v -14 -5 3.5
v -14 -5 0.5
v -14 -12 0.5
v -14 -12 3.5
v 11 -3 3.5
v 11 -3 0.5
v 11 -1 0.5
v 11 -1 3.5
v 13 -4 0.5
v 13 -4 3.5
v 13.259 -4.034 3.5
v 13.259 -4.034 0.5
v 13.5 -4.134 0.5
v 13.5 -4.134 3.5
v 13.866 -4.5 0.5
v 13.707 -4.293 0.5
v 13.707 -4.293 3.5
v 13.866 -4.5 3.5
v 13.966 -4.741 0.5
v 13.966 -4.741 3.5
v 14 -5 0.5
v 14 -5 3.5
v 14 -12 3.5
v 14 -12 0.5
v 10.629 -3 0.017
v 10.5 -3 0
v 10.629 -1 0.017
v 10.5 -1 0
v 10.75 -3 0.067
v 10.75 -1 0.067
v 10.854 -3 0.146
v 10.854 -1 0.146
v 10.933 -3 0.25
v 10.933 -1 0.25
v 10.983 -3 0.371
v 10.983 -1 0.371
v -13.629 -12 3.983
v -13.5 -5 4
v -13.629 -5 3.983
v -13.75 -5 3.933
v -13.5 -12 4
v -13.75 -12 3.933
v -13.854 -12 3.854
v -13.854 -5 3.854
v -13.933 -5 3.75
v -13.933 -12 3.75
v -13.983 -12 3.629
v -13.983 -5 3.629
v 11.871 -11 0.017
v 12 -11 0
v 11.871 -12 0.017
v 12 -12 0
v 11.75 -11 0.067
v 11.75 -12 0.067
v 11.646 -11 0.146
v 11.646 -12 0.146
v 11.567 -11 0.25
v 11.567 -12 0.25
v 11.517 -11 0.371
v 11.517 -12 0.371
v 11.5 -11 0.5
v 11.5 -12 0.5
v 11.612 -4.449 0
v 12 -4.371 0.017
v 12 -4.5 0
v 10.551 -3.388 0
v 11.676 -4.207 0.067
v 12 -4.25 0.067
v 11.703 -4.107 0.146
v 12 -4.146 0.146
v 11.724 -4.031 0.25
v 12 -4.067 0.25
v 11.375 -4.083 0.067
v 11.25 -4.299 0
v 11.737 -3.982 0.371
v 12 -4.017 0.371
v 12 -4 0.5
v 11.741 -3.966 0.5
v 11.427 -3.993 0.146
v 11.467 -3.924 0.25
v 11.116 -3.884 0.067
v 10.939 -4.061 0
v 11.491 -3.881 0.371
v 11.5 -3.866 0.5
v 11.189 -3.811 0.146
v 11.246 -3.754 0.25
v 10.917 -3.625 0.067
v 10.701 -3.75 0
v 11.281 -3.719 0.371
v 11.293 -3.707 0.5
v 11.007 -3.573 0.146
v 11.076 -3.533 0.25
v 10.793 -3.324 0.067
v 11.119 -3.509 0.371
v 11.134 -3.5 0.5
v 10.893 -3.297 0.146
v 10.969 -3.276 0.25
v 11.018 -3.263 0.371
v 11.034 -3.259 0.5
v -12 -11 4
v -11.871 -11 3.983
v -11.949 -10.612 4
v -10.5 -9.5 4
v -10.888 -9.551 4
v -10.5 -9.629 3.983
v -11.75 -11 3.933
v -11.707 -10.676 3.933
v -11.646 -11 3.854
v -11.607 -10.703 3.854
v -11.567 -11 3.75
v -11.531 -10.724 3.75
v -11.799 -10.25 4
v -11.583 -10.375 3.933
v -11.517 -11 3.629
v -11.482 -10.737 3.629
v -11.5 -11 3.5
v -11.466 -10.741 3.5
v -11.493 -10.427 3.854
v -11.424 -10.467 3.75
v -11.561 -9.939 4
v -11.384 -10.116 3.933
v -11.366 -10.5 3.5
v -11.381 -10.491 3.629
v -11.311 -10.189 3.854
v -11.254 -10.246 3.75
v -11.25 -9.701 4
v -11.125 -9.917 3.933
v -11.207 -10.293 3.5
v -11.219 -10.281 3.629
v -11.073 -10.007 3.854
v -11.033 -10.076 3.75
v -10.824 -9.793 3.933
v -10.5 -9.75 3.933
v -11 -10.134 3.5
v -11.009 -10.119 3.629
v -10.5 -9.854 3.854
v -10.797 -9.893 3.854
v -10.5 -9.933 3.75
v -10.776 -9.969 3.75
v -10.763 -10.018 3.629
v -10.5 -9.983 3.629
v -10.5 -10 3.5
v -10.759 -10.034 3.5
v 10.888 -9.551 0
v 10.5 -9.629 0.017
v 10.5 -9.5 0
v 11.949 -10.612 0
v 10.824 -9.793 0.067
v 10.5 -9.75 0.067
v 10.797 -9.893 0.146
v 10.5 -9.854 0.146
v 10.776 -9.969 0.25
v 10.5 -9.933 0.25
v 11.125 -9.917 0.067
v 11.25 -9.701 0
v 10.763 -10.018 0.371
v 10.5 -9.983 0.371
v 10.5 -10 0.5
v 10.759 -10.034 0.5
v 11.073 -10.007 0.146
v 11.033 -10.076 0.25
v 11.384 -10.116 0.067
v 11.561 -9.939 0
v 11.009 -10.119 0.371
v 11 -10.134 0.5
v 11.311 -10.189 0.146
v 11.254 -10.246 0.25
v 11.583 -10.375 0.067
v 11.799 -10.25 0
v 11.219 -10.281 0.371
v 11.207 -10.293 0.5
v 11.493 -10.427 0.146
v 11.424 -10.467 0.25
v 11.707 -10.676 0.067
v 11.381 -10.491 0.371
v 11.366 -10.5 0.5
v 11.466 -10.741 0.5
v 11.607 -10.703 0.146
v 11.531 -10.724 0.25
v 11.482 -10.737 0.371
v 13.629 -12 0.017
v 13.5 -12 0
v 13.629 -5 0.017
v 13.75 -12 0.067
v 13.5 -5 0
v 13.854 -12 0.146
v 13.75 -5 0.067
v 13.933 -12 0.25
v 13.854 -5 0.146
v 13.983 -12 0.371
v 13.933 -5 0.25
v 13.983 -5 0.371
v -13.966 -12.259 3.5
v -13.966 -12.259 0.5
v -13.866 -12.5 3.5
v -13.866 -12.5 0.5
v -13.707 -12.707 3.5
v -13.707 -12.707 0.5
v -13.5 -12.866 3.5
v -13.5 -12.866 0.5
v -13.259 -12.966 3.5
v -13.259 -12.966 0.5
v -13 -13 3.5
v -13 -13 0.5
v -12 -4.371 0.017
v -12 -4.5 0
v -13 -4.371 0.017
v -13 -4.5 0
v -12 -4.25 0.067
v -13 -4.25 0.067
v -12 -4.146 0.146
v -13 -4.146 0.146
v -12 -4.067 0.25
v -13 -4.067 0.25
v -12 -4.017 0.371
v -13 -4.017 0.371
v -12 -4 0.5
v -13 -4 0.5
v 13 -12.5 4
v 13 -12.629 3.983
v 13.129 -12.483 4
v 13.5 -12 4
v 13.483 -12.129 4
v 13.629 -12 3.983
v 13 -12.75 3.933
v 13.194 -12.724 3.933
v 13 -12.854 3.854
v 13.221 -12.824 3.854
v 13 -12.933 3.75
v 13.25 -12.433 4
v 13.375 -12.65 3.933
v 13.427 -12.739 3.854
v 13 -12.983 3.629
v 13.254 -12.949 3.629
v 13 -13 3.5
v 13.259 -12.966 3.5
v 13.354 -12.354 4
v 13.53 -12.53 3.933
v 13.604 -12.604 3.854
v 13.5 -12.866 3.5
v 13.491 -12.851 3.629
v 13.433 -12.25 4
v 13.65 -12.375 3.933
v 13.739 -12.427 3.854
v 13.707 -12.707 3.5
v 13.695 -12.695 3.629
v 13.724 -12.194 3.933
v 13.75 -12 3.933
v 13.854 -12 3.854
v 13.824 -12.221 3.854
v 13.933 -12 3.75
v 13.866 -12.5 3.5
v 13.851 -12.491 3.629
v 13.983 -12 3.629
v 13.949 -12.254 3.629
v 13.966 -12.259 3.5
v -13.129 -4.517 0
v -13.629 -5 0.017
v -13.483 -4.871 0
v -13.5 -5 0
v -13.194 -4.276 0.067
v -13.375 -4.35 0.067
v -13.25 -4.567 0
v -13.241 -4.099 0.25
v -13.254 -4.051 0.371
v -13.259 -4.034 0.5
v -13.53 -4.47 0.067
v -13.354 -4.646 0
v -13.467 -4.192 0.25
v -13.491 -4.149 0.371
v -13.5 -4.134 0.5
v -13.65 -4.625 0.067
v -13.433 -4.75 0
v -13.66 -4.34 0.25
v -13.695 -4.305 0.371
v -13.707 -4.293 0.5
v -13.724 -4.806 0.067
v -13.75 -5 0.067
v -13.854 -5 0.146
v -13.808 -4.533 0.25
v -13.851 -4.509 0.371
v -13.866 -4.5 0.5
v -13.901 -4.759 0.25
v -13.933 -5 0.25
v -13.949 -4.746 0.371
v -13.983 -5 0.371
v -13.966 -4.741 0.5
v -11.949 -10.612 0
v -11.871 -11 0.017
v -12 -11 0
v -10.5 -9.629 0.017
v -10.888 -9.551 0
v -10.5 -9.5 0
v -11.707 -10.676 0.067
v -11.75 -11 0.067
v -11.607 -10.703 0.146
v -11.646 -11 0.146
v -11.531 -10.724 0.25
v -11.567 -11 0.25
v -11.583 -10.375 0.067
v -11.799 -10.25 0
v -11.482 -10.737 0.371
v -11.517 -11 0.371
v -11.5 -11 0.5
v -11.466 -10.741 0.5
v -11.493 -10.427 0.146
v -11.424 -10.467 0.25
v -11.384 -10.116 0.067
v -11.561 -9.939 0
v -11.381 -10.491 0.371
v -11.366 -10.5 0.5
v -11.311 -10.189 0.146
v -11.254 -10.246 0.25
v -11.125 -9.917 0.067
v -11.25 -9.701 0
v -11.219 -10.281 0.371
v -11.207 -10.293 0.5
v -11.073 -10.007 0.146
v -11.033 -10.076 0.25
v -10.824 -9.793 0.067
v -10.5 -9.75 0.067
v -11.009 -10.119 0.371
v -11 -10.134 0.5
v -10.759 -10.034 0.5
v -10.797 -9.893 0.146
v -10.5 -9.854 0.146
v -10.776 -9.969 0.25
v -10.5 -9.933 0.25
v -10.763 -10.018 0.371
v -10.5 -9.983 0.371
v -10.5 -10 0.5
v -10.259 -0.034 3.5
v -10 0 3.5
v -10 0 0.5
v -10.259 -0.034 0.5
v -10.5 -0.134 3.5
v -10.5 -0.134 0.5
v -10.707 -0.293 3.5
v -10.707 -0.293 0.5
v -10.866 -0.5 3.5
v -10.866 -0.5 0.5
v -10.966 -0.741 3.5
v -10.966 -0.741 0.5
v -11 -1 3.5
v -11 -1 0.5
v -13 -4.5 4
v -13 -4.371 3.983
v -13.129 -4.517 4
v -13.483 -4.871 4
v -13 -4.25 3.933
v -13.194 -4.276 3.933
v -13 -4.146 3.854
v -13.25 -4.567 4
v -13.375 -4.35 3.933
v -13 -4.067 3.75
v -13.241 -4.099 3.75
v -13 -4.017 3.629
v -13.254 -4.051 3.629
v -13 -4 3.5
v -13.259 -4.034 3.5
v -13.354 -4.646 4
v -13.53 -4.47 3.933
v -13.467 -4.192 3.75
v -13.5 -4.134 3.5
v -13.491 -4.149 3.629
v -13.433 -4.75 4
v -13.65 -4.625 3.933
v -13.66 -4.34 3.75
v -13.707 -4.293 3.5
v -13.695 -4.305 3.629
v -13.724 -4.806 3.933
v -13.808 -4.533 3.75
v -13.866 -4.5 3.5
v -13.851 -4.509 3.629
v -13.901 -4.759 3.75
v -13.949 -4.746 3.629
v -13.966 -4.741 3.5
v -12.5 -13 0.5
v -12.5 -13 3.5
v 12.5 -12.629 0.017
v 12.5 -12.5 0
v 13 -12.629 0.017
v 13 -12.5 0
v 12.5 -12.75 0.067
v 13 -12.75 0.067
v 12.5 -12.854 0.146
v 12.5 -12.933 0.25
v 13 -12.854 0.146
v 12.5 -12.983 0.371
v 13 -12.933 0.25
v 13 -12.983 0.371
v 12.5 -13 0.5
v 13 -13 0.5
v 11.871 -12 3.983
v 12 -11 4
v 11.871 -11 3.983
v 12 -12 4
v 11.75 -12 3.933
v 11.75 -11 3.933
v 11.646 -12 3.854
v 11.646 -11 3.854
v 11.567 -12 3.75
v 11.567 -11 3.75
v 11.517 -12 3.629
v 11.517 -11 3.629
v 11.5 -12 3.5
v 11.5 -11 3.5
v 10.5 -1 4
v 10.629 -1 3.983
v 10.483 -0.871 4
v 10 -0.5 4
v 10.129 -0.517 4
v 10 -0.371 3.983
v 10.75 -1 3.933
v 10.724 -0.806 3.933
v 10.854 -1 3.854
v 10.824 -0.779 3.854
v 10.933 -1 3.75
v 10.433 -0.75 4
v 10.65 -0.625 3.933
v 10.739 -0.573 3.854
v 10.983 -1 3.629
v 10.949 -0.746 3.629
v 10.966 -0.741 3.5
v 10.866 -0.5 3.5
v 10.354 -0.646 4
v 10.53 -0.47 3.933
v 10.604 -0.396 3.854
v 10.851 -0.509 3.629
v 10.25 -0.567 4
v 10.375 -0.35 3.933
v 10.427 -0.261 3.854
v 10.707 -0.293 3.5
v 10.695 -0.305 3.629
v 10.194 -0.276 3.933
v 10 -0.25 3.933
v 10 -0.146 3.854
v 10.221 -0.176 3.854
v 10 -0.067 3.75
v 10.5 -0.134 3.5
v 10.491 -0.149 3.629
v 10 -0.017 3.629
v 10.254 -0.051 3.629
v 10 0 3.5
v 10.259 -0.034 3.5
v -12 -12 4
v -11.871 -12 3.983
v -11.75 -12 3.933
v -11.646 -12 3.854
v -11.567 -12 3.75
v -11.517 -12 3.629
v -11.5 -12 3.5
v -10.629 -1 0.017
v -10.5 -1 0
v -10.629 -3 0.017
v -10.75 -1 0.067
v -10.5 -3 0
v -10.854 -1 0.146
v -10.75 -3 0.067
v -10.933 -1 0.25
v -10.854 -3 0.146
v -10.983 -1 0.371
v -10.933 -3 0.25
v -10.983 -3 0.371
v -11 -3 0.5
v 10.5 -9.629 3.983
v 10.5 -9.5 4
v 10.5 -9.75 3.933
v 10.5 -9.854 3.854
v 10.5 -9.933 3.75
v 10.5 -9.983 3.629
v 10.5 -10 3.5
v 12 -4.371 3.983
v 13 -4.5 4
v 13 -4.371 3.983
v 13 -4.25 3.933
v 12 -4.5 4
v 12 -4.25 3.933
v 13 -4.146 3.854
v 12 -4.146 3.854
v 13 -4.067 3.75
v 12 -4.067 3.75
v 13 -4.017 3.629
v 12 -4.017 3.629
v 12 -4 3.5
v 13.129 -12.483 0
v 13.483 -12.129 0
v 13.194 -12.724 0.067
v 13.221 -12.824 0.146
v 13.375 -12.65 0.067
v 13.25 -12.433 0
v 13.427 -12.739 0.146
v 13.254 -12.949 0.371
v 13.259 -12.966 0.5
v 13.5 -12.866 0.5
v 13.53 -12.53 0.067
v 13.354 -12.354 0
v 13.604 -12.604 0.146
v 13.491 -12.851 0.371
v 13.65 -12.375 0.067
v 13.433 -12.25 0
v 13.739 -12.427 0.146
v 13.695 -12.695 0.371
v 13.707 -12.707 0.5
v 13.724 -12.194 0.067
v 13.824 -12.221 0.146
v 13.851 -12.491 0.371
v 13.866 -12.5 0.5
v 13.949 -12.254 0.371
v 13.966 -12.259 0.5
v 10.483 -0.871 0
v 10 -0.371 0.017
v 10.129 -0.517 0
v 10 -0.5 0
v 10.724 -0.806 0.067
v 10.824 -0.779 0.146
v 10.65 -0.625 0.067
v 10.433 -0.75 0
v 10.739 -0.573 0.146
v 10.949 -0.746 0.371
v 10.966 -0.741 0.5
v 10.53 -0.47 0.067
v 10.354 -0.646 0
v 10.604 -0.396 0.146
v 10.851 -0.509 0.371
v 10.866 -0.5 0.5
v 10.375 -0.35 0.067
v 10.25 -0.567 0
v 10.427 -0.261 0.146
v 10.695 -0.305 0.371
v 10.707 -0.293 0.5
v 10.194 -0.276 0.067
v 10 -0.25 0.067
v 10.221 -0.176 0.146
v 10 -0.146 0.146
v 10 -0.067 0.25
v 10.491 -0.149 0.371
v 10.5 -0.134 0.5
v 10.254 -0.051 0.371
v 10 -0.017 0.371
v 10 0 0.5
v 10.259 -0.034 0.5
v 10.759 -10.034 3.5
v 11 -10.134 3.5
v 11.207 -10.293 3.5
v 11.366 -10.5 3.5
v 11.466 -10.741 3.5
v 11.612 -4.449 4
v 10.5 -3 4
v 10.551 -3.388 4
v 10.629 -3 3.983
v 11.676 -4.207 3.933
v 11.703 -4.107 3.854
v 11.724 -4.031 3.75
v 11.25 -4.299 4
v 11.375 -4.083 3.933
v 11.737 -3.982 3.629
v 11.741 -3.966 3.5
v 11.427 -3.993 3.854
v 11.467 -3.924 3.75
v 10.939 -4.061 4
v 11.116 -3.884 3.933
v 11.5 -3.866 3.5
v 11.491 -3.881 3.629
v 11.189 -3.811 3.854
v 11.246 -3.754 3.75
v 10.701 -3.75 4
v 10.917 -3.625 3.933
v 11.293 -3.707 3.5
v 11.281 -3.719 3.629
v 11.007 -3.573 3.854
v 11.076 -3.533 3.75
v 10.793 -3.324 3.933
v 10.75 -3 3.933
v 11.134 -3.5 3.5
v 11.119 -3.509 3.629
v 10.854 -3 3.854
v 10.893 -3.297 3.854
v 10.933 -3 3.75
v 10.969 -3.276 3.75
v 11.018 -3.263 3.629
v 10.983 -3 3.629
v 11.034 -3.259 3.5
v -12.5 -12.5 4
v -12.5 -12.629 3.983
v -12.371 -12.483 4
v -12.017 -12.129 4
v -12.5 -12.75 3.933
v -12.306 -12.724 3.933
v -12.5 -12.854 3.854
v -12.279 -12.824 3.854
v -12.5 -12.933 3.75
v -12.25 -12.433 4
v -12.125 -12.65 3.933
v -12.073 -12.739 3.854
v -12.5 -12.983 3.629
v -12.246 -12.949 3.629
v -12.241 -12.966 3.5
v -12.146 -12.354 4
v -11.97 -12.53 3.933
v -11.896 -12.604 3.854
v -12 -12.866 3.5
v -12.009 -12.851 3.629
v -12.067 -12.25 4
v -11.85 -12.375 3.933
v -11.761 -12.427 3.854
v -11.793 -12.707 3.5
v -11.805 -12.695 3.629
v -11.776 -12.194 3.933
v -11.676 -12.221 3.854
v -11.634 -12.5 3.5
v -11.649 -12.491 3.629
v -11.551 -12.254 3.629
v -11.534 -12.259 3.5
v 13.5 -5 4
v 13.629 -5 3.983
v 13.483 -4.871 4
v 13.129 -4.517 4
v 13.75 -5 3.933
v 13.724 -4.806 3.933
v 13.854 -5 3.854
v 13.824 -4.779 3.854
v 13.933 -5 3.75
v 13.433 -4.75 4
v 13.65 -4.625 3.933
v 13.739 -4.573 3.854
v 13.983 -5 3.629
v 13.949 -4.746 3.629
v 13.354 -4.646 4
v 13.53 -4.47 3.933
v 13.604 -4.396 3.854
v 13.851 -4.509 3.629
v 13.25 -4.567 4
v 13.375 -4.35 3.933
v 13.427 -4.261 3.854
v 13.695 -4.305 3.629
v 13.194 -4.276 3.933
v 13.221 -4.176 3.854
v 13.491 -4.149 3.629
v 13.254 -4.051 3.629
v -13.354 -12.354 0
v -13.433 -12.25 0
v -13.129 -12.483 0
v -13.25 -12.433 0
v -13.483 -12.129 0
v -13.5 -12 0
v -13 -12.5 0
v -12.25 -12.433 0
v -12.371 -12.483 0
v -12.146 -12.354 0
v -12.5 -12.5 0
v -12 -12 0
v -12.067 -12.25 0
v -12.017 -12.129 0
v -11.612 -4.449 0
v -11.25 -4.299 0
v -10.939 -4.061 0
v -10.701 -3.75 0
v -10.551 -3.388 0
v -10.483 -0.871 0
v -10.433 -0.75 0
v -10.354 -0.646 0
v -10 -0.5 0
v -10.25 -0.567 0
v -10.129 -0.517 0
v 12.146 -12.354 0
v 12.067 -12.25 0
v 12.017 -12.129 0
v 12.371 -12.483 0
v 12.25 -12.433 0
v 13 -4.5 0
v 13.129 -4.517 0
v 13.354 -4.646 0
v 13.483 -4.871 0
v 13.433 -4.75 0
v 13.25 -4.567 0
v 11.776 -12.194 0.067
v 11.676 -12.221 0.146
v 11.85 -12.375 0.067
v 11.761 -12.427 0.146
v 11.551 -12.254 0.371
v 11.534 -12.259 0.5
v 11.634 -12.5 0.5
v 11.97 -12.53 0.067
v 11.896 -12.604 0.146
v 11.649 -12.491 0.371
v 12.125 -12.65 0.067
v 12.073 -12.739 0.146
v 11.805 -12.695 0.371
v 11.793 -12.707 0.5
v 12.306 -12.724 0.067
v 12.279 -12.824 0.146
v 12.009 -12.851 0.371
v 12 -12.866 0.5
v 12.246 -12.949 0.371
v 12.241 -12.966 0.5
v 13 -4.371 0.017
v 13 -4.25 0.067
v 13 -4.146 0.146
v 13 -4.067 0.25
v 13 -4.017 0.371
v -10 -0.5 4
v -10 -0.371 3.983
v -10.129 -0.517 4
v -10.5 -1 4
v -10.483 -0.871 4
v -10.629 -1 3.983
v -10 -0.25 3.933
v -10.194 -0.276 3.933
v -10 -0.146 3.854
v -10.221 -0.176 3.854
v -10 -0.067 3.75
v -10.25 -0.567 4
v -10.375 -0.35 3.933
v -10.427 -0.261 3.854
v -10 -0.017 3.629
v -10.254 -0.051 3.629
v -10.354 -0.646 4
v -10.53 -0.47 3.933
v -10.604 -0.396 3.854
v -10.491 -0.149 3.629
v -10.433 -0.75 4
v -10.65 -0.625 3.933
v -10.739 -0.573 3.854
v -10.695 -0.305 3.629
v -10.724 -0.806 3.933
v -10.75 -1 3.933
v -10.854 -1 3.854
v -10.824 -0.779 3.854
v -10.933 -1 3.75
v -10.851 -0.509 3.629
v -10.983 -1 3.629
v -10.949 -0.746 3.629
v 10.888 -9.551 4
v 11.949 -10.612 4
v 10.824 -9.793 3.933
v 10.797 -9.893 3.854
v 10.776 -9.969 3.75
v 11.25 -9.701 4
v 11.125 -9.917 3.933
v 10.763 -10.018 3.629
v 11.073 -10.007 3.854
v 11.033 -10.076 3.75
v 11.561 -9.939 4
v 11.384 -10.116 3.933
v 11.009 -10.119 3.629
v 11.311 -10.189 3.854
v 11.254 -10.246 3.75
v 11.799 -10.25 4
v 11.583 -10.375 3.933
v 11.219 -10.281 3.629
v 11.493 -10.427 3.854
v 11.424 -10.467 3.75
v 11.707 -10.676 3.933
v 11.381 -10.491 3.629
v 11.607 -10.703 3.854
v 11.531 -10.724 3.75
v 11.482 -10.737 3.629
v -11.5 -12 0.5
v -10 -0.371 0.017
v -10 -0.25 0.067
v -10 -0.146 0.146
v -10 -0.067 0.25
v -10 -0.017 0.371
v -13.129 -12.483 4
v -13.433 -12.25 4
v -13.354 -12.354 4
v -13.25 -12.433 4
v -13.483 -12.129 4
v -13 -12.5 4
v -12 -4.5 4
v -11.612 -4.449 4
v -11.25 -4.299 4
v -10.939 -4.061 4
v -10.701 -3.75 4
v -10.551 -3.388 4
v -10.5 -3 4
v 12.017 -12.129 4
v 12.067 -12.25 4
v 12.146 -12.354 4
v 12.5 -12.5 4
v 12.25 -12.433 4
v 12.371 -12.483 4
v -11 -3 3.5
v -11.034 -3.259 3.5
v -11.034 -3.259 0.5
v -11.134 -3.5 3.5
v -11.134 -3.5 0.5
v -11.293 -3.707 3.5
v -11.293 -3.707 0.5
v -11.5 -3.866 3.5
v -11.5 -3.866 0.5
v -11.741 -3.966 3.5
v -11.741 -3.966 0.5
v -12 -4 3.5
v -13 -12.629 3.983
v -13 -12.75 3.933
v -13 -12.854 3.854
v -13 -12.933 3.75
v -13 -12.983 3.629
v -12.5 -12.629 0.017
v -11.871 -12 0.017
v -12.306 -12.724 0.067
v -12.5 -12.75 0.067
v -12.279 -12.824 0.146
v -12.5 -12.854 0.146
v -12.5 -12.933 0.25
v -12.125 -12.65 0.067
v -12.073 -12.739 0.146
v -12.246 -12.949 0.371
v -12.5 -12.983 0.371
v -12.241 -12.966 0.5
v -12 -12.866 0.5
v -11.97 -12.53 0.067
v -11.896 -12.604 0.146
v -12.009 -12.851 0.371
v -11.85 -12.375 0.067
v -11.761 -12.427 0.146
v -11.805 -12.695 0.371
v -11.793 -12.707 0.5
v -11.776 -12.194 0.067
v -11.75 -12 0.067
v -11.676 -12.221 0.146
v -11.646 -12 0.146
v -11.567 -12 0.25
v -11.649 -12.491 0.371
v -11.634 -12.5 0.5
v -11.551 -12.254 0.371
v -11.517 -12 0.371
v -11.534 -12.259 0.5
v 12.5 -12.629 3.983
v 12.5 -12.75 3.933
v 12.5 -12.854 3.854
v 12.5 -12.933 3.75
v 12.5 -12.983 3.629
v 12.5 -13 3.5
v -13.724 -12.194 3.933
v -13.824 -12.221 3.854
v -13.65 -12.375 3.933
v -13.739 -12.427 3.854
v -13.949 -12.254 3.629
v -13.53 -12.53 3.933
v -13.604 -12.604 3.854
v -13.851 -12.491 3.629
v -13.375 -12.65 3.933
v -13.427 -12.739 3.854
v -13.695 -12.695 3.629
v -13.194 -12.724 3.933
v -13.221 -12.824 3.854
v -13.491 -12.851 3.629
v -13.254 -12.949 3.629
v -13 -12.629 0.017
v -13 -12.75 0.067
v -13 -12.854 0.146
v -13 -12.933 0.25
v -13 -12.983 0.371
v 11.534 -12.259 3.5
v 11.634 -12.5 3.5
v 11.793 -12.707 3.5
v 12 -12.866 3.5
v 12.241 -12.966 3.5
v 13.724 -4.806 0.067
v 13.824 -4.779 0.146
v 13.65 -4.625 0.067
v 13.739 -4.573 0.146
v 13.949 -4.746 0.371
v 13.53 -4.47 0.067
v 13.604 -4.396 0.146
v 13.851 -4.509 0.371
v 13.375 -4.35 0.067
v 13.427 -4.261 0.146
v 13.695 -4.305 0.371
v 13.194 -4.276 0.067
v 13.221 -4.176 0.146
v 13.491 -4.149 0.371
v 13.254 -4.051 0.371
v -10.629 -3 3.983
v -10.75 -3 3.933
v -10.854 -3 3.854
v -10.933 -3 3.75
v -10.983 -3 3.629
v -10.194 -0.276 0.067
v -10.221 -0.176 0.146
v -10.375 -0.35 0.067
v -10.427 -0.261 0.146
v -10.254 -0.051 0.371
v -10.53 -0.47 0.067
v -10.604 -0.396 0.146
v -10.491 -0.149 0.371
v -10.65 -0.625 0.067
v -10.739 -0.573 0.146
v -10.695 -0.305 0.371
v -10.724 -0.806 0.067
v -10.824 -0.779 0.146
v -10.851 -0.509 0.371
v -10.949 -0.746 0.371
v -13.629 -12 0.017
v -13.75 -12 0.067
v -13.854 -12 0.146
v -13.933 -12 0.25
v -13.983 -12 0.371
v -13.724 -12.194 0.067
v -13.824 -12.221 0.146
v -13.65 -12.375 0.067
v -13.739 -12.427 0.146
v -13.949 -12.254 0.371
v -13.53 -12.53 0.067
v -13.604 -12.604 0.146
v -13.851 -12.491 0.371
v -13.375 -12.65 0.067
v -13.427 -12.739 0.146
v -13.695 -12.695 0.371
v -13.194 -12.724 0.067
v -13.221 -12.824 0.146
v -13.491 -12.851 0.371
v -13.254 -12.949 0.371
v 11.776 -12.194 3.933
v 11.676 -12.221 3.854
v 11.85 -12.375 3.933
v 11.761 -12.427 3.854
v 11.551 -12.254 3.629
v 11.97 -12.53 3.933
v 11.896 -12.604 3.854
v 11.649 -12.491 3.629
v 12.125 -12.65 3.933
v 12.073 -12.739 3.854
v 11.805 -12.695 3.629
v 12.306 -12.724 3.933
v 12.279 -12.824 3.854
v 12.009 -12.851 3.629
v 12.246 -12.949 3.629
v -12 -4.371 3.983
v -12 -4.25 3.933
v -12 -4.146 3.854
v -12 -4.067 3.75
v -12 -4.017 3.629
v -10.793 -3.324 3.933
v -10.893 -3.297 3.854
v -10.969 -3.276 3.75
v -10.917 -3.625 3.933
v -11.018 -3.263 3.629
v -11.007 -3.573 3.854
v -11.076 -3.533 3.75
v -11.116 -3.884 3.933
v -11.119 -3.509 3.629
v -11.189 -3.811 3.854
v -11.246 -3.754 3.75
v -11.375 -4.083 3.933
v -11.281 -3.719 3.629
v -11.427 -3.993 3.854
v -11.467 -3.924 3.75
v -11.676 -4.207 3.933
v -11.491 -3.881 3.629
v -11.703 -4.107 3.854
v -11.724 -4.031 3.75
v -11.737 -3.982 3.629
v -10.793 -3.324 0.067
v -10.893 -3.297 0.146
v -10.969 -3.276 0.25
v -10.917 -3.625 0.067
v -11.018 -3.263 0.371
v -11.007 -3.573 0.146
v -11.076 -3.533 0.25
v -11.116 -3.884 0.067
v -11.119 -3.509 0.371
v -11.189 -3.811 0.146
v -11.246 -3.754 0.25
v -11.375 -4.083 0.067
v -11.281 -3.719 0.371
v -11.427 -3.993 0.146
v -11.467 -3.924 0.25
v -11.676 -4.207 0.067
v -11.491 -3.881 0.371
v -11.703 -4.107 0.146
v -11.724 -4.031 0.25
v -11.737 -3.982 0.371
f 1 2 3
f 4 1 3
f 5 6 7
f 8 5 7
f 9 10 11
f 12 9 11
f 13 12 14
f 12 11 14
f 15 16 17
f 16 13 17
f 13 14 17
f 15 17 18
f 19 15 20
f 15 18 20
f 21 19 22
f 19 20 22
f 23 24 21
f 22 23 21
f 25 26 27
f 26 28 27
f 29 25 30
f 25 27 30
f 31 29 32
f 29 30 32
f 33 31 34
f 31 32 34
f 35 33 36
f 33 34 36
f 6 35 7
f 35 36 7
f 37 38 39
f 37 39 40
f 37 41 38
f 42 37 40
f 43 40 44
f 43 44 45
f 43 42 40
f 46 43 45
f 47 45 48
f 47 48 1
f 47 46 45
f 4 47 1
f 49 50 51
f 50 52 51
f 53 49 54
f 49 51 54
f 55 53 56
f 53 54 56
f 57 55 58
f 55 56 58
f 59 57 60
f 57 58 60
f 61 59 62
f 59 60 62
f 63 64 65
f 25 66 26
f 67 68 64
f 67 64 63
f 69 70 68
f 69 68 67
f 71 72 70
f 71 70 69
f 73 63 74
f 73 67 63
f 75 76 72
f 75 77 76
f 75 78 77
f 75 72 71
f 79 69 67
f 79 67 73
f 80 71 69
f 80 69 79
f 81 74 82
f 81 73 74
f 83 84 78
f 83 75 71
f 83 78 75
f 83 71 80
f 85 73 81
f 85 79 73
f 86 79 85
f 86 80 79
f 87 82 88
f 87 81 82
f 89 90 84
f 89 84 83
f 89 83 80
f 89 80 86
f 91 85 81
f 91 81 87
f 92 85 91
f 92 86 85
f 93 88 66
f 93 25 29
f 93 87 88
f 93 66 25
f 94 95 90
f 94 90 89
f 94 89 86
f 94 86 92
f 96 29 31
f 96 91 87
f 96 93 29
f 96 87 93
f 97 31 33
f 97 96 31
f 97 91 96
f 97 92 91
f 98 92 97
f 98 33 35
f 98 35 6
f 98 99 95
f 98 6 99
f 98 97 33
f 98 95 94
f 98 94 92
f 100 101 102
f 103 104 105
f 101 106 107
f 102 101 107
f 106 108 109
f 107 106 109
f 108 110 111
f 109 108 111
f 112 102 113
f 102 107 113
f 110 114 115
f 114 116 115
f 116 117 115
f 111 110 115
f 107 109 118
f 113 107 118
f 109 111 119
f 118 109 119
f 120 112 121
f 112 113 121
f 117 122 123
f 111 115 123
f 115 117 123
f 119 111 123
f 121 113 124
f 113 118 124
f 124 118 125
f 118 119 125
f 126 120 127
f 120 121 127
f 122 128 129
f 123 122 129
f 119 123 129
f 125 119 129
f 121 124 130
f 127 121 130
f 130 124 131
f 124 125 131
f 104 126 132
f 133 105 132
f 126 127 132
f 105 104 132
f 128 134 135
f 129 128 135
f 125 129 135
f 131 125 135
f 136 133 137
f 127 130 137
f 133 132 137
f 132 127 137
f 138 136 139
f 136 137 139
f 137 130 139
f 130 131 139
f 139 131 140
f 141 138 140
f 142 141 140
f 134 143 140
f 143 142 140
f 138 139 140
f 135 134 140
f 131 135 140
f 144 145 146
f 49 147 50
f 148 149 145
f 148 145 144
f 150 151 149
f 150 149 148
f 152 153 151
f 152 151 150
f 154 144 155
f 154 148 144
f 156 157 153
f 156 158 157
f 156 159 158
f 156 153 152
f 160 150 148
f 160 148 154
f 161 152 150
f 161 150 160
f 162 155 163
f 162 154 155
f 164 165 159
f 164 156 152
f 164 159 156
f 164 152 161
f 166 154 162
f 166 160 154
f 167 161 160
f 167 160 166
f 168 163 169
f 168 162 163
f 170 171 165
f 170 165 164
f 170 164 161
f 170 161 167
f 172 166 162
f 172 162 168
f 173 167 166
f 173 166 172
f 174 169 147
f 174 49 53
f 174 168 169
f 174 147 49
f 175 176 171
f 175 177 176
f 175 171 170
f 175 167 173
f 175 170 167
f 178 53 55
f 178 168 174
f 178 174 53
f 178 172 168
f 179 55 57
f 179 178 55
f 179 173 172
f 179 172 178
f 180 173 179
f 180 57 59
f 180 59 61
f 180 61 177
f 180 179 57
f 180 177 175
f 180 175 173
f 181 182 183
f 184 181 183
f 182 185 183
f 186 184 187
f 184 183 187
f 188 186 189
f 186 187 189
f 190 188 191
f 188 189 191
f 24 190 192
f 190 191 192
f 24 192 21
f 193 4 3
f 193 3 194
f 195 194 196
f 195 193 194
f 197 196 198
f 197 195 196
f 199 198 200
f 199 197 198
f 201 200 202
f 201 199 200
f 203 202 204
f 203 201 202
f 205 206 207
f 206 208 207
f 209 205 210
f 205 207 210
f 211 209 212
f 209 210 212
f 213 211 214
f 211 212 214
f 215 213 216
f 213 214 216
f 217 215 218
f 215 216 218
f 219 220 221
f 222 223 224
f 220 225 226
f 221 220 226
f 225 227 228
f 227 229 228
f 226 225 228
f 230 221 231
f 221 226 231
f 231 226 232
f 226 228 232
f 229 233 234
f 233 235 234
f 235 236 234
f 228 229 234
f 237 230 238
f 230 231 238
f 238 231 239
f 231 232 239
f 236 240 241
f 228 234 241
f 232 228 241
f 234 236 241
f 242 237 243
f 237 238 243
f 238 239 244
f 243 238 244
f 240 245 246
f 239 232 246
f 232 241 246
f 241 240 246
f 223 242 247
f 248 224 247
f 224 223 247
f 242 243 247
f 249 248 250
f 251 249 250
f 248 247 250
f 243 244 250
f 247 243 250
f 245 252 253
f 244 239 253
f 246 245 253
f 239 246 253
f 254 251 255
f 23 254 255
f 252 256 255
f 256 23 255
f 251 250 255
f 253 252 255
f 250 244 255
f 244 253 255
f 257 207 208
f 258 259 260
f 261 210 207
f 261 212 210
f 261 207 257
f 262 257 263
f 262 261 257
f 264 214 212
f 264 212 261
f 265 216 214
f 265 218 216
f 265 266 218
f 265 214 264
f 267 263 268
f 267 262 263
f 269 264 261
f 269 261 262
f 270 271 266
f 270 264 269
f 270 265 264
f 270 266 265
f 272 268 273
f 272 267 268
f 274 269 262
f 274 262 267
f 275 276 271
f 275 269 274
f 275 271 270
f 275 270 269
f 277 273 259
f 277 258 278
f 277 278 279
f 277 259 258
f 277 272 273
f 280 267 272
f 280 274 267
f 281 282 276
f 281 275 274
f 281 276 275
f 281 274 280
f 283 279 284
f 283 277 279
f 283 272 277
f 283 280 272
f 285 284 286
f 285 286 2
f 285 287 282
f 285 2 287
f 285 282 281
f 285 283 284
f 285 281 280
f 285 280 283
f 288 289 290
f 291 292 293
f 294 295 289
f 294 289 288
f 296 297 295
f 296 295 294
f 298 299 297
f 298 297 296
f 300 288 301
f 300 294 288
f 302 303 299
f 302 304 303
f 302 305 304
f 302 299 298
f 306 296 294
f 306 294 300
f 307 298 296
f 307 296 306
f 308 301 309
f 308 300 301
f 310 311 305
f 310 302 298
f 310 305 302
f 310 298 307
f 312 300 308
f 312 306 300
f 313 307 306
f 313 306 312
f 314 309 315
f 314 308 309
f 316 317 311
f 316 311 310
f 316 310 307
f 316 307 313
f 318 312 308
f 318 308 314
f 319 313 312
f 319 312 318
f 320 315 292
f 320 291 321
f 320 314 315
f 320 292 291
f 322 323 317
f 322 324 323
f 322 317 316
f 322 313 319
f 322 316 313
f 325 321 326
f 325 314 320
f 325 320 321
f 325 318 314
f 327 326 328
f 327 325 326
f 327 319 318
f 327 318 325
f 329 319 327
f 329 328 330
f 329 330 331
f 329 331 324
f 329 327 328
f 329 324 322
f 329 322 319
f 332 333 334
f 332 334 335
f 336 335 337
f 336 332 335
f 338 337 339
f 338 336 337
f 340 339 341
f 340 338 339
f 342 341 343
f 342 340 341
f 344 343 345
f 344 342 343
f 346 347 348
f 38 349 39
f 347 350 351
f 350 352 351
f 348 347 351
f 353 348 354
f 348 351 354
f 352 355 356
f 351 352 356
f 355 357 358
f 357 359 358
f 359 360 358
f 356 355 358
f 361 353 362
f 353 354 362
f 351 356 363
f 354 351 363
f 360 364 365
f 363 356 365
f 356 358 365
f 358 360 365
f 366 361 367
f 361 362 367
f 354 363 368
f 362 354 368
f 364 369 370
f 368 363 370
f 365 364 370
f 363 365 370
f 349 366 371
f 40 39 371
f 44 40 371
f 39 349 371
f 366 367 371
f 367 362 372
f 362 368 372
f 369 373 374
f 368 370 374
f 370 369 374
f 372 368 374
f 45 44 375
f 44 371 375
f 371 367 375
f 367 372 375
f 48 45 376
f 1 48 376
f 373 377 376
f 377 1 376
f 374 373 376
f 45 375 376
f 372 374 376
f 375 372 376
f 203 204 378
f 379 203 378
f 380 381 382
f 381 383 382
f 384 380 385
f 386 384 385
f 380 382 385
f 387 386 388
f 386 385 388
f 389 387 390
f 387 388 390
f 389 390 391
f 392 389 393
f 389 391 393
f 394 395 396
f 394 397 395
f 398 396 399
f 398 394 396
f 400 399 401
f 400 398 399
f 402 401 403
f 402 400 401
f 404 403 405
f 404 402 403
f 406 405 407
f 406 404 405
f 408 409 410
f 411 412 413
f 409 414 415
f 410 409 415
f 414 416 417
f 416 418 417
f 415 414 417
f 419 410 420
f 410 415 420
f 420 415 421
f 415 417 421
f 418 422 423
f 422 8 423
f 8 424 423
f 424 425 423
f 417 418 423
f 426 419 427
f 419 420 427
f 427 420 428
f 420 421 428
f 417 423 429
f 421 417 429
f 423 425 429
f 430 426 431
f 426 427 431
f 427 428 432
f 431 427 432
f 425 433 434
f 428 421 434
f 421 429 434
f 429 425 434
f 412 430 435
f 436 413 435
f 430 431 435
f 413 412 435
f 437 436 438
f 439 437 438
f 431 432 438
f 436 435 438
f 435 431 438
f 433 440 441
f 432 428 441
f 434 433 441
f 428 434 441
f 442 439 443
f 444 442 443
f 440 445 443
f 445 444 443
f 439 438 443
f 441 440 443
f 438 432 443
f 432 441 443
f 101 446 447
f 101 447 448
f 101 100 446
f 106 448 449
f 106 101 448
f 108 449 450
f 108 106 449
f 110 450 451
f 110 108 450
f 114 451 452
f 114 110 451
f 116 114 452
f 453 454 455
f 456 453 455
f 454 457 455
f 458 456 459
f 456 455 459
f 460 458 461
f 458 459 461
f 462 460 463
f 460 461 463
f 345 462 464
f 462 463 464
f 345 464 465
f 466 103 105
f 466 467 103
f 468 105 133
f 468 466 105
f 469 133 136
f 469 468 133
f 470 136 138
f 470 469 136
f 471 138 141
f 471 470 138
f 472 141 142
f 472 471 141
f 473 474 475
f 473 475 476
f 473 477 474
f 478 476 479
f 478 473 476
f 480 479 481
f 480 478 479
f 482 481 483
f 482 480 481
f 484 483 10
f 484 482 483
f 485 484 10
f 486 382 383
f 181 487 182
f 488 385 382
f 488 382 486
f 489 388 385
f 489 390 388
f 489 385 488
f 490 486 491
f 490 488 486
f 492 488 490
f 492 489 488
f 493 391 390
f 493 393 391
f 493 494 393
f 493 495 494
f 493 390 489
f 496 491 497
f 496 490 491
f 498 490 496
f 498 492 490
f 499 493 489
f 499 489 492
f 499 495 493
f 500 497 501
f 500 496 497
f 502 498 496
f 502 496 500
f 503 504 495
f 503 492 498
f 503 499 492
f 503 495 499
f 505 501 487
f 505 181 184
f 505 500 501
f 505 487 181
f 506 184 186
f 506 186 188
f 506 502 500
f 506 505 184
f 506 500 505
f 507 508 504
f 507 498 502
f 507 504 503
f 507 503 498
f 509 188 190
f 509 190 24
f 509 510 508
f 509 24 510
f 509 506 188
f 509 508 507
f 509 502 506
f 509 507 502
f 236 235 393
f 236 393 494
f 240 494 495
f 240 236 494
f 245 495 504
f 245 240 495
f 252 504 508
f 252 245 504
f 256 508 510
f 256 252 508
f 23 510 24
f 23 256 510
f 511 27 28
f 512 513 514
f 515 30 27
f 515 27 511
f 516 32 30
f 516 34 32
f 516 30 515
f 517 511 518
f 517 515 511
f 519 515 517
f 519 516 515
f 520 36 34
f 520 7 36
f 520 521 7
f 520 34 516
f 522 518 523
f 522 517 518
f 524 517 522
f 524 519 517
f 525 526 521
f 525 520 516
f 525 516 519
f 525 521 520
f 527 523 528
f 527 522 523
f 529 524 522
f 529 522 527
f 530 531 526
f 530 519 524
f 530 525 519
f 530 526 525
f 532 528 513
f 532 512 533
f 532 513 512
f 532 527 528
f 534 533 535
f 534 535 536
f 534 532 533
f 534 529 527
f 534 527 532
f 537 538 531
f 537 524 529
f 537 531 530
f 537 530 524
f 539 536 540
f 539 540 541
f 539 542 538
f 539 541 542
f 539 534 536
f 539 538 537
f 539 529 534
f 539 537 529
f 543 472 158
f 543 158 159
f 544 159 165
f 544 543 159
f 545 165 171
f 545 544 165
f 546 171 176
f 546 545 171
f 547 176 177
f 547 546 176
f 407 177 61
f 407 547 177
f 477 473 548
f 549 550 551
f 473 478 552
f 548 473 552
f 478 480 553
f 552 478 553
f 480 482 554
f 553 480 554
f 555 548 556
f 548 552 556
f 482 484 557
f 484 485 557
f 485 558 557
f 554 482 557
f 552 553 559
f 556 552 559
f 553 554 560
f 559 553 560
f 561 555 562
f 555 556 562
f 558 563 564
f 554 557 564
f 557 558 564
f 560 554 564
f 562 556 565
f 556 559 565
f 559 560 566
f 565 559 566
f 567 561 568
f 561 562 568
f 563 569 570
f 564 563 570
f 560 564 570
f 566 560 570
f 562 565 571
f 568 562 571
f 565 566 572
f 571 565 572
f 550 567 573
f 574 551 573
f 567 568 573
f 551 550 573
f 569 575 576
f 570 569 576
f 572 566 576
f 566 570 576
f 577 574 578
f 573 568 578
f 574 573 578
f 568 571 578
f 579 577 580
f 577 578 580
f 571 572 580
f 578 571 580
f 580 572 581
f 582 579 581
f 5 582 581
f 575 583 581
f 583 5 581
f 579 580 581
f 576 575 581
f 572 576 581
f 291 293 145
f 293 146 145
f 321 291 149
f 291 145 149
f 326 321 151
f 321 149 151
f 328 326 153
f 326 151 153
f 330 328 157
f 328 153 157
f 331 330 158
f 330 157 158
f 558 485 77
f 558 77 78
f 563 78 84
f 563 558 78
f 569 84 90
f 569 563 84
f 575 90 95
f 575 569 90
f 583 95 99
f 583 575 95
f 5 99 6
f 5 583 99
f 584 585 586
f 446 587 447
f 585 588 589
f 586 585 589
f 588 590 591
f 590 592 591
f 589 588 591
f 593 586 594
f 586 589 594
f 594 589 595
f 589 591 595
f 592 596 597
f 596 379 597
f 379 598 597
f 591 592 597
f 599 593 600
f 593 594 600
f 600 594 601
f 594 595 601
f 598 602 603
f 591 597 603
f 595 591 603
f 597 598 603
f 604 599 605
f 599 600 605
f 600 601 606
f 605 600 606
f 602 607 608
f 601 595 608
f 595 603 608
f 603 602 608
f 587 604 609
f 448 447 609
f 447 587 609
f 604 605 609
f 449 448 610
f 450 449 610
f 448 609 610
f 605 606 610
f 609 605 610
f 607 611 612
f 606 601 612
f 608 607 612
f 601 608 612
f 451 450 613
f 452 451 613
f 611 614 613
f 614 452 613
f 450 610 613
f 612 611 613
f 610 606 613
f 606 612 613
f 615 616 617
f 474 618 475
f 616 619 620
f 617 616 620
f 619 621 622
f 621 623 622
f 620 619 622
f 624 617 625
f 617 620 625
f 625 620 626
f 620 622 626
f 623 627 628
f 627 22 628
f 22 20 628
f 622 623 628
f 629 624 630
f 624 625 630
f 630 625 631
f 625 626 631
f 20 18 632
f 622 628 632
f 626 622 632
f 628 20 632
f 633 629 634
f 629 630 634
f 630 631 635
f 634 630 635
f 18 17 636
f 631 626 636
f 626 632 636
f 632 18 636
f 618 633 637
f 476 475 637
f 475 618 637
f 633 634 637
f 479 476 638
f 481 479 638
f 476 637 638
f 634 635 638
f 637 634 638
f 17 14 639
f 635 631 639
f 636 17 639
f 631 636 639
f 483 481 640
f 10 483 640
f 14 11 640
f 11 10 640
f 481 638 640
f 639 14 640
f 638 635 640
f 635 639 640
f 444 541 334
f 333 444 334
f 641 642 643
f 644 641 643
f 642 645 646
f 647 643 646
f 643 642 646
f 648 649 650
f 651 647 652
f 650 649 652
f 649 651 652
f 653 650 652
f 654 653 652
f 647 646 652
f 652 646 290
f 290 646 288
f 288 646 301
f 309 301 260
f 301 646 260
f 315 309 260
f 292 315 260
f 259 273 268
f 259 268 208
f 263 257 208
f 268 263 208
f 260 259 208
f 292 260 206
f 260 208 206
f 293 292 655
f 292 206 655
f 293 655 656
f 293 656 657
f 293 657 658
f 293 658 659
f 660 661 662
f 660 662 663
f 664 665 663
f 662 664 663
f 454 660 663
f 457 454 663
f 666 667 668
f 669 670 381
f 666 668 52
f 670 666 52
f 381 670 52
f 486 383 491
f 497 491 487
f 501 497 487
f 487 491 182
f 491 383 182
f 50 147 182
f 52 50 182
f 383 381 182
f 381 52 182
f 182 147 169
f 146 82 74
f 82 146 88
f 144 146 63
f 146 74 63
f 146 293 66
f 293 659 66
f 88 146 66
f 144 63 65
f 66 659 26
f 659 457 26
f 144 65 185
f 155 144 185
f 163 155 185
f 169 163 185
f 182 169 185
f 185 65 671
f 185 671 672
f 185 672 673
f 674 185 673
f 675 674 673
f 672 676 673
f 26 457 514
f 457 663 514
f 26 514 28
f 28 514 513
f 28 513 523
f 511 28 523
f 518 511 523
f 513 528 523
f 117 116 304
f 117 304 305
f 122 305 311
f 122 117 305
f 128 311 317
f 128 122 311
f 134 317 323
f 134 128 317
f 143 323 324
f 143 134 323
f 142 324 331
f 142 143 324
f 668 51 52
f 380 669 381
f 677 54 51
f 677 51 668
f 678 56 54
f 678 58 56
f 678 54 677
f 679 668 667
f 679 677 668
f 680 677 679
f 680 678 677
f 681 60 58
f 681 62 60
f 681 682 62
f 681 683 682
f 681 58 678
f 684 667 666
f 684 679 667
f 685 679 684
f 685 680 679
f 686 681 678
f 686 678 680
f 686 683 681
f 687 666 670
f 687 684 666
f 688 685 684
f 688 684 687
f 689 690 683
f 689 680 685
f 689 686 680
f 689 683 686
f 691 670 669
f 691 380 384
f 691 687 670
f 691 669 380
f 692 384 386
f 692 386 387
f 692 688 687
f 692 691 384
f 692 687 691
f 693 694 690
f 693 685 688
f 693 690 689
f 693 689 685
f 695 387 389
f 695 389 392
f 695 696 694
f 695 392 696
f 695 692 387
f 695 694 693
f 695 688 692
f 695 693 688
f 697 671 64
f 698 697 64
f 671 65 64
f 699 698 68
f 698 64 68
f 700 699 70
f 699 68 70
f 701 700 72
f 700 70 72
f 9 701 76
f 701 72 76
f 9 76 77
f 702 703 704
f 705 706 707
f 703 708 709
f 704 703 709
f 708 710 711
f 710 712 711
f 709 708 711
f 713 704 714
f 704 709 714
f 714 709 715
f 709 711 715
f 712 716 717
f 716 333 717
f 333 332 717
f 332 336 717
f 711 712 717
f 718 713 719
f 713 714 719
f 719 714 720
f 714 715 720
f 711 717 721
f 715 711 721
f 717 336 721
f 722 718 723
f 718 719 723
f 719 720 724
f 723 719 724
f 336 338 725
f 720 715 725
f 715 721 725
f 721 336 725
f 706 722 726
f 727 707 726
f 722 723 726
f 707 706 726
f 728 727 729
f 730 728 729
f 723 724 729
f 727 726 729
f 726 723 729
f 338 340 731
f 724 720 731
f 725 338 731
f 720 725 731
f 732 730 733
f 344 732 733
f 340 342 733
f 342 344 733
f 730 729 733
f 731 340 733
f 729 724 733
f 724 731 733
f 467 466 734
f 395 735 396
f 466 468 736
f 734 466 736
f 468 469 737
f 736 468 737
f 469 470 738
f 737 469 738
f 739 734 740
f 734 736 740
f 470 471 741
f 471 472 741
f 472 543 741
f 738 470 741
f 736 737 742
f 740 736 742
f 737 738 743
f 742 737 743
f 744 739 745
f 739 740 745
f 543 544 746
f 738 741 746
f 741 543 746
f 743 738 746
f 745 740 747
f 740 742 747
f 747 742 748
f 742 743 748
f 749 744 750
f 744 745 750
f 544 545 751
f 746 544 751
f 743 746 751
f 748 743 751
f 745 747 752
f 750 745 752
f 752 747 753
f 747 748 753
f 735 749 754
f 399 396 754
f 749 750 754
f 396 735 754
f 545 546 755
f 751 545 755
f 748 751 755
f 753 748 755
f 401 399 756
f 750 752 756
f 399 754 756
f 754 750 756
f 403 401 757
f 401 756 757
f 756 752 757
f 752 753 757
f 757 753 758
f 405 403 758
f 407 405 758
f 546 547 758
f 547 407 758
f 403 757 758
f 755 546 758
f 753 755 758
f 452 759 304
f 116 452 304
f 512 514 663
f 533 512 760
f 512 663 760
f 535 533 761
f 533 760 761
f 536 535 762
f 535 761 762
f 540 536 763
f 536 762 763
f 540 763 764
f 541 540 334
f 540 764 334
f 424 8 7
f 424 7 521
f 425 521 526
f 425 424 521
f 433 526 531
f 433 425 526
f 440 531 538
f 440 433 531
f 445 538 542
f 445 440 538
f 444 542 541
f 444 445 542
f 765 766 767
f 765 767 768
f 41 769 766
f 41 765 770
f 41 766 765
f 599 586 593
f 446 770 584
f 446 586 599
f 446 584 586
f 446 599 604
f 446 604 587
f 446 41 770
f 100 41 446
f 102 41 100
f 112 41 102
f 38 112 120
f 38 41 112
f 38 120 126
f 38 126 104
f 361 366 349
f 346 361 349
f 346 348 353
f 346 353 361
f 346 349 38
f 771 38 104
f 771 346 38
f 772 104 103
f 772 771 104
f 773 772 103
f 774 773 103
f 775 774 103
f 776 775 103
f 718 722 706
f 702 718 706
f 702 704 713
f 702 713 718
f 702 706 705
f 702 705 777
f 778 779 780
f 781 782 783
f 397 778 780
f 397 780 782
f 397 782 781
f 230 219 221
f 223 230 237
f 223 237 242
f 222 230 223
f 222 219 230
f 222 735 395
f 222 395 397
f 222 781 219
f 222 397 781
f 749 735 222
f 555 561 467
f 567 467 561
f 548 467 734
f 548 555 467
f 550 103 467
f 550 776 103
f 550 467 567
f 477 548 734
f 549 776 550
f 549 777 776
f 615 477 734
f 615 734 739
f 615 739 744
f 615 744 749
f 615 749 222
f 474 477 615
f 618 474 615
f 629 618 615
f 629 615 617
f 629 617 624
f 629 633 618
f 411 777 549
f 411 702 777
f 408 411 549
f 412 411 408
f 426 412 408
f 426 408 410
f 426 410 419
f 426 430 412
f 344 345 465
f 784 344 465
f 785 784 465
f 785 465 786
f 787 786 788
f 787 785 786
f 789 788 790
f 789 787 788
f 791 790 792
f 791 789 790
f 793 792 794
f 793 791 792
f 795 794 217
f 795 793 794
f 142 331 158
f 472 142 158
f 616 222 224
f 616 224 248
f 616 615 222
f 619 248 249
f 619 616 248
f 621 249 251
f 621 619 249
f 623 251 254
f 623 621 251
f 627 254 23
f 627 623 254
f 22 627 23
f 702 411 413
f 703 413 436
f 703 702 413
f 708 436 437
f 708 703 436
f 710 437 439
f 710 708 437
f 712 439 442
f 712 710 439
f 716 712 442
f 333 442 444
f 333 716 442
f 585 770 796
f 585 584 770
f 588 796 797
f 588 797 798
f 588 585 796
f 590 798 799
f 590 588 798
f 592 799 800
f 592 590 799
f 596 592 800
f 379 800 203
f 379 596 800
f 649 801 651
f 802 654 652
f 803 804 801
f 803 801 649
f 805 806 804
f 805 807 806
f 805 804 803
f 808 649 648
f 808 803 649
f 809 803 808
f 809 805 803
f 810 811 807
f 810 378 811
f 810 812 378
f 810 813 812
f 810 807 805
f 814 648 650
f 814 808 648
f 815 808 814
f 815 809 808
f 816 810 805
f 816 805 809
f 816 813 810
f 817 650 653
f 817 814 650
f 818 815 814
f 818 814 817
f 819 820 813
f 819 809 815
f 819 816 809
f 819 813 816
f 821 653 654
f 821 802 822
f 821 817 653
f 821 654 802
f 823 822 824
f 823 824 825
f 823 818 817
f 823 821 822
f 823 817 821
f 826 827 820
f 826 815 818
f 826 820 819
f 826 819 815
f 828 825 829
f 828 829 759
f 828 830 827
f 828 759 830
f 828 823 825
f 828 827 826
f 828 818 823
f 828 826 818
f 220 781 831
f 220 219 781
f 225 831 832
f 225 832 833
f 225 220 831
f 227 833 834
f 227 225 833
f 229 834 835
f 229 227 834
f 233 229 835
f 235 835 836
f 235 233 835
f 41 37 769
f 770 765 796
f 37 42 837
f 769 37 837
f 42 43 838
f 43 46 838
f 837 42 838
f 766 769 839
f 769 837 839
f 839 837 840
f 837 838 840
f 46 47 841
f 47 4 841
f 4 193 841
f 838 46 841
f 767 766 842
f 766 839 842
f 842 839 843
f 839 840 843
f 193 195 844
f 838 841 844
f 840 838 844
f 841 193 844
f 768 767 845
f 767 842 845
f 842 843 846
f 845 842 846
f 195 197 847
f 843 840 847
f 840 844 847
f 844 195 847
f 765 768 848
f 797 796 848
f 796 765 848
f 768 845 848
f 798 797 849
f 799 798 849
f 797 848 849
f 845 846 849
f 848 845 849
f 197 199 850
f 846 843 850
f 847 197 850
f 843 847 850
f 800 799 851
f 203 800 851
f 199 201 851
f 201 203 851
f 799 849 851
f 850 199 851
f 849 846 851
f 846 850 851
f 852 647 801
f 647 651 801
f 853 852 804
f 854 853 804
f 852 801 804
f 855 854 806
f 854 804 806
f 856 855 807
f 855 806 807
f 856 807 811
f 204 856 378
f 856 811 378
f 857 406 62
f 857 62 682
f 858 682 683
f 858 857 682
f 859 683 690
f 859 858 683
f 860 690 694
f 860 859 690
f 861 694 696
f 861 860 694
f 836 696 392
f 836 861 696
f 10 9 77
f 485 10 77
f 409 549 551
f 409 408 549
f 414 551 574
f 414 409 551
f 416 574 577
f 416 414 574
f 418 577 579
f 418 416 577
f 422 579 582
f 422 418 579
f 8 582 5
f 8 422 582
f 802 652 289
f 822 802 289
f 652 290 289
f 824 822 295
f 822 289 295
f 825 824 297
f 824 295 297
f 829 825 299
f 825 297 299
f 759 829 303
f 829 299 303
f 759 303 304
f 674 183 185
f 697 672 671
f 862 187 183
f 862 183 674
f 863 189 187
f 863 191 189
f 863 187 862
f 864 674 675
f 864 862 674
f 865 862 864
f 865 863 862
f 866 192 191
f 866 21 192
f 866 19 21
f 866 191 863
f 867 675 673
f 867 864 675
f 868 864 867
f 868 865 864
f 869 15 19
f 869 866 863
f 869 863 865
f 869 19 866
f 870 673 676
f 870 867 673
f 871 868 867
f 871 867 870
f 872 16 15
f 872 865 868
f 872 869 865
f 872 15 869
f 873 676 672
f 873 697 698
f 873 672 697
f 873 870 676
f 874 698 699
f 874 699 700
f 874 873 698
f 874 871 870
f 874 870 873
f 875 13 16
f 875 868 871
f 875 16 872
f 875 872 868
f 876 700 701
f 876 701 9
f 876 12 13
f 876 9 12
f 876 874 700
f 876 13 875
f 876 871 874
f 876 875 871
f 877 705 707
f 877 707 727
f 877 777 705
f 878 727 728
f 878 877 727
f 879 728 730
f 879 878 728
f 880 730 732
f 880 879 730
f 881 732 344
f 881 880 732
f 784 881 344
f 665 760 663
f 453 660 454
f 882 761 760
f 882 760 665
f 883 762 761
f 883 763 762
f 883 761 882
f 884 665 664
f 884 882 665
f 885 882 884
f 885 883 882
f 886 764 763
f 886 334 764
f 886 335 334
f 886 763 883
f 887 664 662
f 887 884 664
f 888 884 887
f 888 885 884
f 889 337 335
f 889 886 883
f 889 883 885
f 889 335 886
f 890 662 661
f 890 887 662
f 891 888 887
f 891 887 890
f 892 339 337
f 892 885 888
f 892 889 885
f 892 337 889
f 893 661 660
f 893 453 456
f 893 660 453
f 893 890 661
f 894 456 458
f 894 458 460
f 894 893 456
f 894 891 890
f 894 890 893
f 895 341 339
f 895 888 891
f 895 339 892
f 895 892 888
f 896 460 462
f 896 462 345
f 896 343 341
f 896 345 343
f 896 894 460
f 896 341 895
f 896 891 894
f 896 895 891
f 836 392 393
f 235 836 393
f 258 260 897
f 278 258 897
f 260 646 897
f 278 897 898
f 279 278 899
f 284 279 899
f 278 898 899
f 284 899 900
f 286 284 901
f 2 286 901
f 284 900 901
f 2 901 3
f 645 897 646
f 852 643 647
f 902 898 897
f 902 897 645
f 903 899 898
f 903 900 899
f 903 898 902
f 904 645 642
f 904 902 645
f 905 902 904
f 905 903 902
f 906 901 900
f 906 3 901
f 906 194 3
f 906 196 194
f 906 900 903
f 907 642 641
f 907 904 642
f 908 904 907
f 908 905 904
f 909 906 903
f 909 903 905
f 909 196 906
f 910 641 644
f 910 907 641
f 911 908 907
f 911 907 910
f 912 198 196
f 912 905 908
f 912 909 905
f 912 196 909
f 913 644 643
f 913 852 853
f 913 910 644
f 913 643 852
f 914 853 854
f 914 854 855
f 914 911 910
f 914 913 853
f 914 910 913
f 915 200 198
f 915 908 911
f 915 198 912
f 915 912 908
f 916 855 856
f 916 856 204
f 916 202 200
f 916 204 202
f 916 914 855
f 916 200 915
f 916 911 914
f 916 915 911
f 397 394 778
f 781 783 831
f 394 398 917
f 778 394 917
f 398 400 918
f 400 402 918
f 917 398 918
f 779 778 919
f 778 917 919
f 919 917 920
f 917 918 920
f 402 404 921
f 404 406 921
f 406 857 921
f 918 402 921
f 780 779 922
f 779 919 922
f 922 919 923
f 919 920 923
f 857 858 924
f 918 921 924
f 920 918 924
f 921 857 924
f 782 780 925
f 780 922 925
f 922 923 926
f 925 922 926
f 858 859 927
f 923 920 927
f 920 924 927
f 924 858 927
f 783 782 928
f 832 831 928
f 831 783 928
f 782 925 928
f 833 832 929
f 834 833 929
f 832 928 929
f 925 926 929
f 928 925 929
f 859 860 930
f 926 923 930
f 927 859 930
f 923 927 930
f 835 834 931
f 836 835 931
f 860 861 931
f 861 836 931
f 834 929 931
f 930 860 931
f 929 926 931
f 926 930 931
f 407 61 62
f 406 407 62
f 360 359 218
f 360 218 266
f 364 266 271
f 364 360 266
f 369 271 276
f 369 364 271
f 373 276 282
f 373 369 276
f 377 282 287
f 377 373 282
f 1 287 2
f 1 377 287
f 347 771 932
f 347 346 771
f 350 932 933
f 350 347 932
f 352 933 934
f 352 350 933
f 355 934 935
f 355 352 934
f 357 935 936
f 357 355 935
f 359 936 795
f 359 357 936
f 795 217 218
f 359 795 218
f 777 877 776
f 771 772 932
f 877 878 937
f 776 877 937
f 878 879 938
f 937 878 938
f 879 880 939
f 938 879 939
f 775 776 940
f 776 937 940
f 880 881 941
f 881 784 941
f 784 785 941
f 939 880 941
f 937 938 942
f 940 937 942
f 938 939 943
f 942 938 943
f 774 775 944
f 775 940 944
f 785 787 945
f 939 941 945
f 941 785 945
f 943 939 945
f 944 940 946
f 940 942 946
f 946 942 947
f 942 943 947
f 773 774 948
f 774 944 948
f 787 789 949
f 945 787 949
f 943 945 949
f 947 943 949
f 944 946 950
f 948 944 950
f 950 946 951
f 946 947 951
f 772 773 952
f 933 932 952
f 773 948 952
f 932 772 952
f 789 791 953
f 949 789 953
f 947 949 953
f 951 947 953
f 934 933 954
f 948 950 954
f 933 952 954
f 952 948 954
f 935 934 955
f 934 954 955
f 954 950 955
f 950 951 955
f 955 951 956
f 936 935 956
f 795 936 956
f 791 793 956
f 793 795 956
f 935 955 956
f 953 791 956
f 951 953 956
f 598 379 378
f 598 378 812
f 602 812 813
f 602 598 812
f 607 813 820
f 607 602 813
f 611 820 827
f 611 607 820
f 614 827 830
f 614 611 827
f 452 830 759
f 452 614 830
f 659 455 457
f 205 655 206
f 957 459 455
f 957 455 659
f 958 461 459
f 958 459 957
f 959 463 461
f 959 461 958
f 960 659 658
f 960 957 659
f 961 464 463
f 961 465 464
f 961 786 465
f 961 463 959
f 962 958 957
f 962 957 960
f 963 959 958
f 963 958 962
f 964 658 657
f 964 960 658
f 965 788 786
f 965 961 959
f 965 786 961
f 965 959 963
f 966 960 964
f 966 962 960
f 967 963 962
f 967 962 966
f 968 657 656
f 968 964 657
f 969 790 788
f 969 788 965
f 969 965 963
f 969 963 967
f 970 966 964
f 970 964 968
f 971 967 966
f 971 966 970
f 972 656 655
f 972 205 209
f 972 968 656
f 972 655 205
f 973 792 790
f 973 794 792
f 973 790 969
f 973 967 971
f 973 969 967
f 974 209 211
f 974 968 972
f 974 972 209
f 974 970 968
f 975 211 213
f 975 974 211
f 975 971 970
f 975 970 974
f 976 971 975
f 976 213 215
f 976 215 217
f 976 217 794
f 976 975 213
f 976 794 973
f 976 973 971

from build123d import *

# Parameters (mm, degrees)
F1_DEPTH = 4
F2_R     = 1
F3_R     = 0.5


with BuildPart() as f1:
    # F0 (on Top) → F1 (new body)
    with BuildSketch(Plane.XY):
        Polygon((14, -4), (11, -4), (11, 0), (-11, 0), (-11, -4), (-14, -4), (-14, -13), (-11.5, -13), (-11.5, -10), (11.5, -10), (11.5, -13), (14, -13), align=None)
    extrude(amount=F1_DEPTH)

    # F2
    f2_edges = [f1.edges().sort_by_distance(p)[0] for p in [
        (-11.5, -13, 2),
        (11.5, -13, 2),
        (-14, -13, 2),
        (-11.5, -10, 2),
        (14, -13, 2),
        (11.5, -10, 2),
        (14, -4, 2),
        (11, -4, 2),
        (11, 0, 2),
        (-11, 0, 2),
        (-11, -4, 2),
        (-14, -4, 2),
    ]]
    fillet(f2_edges, radius=F2_R)

    # F3
    f3_edges = [f1.edges().sort_by_distance(p)[0] for p in [
        (-14, -8.5, 4),
        (-14, -8.5, 0),
    ]]
    fillet(f3_edges, radius=F3_R)


solid = f1.part
